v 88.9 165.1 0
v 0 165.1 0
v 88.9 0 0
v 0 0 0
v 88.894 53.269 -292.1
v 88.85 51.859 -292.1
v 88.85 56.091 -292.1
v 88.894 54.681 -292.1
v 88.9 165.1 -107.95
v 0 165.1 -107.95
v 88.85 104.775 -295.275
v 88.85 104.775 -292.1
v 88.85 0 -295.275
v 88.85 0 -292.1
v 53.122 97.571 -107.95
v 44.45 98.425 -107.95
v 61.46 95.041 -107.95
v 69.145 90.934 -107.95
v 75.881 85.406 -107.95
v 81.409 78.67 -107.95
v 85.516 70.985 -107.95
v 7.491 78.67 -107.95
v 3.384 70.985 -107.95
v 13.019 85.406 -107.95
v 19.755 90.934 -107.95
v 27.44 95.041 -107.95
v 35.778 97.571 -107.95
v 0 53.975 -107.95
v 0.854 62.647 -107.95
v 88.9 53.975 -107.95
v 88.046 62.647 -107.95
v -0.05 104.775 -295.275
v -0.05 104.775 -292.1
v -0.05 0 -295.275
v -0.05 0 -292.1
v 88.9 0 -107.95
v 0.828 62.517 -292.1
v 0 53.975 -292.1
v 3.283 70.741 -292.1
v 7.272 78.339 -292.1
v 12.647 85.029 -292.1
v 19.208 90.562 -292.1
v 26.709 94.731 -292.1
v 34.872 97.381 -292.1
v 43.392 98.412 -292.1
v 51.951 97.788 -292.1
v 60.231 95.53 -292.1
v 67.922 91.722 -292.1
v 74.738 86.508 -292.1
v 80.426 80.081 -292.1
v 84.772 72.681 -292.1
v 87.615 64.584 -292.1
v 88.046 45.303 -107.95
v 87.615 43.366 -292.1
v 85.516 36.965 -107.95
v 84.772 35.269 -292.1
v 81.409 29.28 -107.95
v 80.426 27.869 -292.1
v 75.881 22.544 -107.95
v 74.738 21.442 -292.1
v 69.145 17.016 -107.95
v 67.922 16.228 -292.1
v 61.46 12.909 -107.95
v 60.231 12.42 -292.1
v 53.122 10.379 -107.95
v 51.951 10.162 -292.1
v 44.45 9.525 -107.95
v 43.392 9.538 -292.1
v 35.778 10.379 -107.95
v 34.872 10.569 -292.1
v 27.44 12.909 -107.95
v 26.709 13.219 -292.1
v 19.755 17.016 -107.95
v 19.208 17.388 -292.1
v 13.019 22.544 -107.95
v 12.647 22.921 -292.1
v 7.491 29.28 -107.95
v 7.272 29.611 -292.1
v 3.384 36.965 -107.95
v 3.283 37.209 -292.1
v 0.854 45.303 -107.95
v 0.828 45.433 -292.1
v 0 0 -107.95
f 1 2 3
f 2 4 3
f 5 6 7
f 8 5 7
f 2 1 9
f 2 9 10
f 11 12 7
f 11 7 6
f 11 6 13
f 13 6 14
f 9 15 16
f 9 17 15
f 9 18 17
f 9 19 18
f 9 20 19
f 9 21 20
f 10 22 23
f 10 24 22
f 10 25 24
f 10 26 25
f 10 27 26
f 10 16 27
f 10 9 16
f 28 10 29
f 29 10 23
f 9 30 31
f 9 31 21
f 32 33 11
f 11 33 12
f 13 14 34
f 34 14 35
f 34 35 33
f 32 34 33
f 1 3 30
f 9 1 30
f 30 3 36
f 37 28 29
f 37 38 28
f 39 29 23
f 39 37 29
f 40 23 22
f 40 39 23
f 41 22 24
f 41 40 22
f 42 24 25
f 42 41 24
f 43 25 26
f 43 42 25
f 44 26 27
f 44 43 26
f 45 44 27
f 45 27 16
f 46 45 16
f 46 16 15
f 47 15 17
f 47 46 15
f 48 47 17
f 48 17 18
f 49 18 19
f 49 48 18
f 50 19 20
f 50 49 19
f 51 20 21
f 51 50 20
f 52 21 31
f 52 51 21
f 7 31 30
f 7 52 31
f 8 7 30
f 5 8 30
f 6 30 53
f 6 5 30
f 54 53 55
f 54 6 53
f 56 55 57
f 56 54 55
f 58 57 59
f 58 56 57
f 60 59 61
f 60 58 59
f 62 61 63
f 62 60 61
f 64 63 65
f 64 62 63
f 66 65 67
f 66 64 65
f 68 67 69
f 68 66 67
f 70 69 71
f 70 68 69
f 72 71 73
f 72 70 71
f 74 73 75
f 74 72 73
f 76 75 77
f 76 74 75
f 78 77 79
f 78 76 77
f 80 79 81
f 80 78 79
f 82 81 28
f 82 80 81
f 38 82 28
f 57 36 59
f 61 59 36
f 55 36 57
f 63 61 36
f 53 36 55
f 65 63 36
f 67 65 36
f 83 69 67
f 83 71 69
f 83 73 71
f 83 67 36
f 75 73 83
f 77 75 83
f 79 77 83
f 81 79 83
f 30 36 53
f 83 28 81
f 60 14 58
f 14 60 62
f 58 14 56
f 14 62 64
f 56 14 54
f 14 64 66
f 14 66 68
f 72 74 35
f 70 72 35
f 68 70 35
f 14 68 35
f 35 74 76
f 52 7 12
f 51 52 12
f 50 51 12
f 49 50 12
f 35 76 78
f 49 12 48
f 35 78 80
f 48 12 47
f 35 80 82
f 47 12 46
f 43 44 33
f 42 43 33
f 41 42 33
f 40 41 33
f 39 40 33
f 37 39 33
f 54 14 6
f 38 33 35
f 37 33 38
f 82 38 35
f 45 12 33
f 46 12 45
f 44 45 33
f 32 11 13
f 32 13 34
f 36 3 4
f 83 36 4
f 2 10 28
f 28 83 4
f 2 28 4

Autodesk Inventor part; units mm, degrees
ref_plane "YZ Plane" through (0, 0, 0) normal (1, 0, 0) x (0, 1, 0)
ref_plane "XZ Plane" through (0, 0, 0) normal (0, 1, 0) x (-1, 0, 0)
ref_plane "XY Plane" through (0, 0, 0) normal (0, 0, 1) x (1, 0, 0)
sketch "Sketch1" plane through (0, 0, 0) normal (0, 1, 0) x (-1, 0, 0)
  line L0 (0, 0) -> (-88.9, 0)
  line L1 (-88.9, 0) -> (-88.9, -292.1)
  line L2 (-88.9, -292.1) -> (0, -292.1)
  line L3 (0, -292.1) -> (0, 0)
  dimension "d2" = 88.9
  dimension "d3" = 292.1
extrude "Extrusion1" add sketch "Sketch1" along normal blind 165.1
sketch "Sketch2" plane through (88.9, 0, -292.1) normal (0, 0, -1) x (-1, 0, 0)
  line L0 (88.9, 165.1) -> (0, 165.1) projected
  line L1 (0, 0) -> (88.9, 0)
  line L2 (88.9, 0) -> (88.9, 165.1)
  line L3 (88.9, 165.1) -> (0, 165.1)
  line L4 (0, 165.1) -> (0, 0)
  circle A0 centre (44.45, 53.975) radius 44.45
  dimension "d6" = 44.45
  dimension "d7" = 88.9
  dimension "d8" = 53.975
extrude "Extrusion2" cut sketch "Sketch2" against normal blind 184.15 contours L2 A0 L4 L0 | L2 L1 L4 A0
sketch "Sketch3" plane through (44.45, 53.975, -292.1) normal (0, 0, -1) x (-1, 0, 0)
  line L0 (-44.3996, -53.975) -> (44.5004, -53.975)
  line L1 (44.5004, -53.975) -> (44.5004, 50.8)
  line L2 (44.5004, 50.8) -> (-44.3996, 50.8)
  line L3 (-44.3996, 50.8) -> (-44.3996, -53.975)
  point P0 (44.45, -53.975)
  dimension "d11" = 88.9
  dimension "d12" = 104.775
extrude "Extrusion3" add sketch "Sketch3" along normal blind 3.175
properties part number "compressor"
